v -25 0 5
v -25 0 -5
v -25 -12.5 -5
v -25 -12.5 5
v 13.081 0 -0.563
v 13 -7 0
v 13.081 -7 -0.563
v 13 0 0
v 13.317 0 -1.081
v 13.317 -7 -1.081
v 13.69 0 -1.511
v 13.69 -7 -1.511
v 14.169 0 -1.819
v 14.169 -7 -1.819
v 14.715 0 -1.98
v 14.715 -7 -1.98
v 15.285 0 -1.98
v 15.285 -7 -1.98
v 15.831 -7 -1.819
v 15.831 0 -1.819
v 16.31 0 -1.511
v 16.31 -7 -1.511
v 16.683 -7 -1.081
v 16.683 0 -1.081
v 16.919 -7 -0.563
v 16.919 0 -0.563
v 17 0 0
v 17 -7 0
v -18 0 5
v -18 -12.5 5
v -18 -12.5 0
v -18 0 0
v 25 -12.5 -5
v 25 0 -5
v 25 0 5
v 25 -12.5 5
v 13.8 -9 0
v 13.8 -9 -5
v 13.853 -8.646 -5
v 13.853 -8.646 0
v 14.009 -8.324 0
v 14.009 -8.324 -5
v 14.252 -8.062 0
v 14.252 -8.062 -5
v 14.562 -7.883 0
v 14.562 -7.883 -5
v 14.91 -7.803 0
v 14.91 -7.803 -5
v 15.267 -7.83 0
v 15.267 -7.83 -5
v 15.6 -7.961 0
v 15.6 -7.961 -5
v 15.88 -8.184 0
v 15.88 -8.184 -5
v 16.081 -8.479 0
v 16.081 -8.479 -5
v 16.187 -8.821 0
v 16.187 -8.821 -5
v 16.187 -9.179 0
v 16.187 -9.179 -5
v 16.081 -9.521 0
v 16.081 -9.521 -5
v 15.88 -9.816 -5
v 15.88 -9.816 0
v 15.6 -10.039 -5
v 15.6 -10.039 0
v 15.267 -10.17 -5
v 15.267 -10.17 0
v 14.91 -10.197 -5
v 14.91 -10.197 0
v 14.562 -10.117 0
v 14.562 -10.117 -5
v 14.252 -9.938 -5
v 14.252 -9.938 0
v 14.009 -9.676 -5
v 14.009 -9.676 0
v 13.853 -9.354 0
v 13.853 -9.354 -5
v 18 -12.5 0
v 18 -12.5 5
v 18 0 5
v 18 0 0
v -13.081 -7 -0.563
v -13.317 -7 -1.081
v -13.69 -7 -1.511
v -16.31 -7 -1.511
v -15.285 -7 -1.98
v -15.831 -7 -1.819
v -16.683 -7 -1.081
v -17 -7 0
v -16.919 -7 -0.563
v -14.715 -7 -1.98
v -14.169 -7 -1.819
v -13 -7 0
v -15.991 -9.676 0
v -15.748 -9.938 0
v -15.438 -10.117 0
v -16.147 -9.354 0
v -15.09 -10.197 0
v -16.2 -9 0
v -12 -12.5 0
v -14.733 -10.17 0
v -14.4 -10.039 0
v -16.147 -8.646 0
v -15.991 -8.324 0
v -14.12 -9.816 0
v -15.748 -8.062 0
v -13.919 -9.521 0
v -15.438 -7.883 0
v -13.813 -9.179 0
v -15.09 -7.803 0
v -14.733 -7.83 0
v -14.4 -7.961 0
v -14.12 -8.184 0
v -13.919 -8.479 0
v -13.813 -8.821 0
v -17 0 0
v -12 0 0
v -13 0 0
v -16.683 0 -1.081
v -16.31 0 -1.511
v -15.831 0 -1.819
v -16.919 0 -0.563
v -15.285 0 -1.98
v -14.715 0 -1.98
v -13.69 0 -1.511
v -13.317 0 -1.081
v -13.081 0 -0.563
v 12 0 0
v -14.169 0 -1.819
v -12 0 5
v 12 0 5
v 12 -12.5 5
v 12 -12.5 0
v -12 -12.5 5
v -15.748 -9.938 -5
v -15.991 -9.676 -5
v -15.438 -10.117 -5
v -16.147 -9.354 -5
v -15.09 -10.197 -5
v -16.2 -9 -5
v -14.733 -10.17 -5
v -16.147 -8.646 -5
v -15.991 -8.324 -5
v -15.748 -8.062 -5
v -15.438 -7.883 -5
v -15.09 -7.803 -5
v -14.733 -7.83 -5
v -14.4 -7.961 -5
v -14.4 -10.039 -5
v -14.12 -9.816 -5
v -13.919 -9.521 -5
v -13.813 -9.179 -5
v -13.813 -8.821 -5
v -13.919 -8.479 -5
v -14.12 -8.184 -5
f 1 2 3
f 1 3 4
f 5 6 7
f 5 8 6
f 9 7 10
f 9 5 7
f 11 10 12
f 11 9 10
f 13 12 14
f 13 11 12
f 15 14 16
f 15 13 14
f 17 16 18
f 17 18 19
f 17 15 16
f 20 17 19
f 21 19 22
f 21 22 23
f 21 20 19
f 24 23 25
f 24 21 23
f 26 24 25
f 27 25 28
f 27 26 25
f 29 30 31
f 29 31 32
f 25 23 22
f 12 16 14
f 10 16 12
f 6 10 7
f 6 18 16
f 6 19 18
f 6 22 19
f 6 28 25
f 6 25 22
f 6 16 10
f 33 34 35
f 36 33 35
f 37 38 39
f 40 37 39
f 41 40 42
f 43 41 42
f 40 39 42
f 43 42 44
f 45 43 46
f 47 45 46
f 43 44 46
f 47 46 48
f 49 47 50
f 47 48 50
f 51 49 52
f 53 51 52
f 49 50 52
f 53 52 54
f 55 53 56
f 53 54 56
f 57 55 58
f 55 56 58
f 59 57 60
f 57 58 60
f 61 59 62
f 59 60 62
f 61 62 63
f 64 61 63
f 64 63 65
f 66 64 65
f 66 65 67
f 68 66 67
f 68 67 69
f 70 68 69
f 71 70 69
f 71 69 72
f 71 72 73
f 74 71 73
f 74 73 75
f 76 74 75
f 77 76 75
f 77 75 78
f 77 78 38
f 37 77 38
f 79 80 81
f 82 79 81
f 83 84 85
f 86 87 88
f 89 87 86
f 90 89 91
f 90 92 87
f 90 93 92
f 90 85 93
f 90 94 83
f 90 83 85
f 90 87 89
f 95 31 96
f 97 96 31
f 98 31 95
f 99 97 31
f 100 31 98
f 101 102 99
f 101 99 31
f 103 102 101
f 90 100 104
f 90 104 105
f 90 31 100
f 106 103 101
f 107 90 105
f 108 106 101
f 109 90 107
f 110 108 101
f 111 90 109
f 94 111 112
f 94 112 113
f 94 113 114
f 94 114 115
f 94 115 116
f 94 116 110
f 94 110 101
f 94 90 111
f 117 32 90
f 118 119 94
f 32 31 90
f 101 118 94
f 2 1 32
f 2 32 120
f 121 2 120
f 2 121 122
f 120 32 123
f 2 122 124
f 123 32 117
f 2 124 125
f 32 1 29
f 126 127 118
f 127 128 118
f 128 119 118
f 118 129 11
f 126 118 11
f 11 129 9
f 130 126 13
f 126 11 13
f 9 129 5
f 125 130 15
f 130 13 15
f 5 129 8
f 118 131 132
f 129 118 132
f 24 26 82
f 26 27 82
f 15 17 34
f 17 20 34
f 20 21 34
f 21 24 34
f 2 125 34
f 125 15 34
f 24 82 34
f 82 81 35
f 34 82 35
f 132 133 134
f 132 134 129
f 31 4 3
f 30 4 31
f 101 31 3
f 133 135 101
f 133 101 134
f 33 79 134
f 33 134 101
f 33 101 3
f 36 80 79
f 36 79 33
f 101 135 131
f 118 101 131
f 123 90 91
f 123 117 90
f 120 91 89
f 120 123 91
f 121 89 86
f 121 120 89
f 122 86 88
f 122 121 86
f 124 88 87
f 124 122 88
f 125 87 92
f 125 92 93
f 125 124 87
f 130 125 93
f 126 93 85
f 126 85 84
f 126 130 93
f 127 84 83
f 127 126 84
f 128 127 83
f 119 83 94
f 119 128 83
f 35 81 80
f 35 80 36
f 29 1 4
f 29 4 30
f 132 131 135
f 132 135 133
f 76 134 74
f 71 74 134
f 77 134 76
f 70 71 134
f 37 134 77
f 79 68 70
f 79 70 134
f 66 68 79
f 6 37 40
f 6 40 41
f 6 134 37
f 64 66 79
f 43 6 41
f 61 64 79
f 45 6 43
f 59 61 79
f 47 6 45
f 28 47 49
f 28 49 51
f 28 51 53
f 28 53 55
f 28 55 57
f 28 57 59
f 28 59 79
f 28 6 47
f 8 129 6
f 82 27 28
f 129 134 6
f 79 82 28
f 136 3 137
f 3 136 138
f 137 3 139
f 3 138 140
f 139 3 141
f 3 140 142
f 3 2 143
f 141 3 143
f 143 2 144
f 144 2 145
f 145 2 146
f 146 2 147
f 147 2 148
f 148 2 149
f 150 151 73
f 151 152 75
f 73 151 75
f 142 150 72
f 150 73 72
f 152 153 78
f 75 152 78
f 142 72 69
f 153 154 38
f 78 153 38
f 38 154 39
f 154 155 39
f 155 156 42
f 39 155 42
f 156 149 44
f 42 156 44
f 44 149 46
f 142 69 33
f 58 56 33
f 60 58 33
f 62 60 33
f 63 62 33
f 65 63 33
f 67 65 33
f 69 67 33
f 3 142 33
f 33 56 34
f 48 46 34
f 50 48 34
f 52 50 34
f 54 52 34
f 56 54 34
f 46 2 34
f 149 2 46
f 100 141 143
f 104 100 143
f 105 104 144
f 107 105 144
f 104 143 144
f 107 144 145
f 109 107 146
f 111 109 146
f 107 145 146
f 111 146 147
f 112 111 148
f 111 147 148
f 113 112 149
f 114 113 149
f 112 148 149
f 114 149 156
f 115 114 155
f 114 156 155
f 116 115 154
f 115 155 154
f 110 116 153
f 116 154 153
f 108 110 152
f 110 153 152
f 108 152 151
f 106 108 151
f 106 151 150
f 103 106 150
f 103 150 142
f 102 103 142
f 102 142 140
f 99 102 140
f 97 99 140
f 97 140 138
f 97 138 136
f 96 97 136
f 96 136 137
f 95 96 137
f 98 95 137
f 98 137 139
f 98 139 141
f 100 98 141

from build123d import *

# Parameters (mm, degrees)
F0_W       = 50
F0_H       = 10
F1_DEPTH   = 12.5
F2_W       = 6
F2_H       = 12.5
F3_DEPTH   = 5
F4_W       = 2
F4_H       = 7
F5_W       = 2
F5_H       = 7
F8_D       = 2.4
F8_ON_F5_D = 2.4


with BuildPart() as f1:
    # F0 (on Front) → F1 (new body)
    with BuildSketch(Plane.XZ):
        Rectangle(F0_W, F0_H)
    extrude(amount=F1_DEPTH)

    # F2 (on face) → F3 (cut)
    with BuildSketch(Plane.XY.offset(5)):
        with Locations((-15, -6.25)):
            Rectangle(F2_W, F2_H)
        with Locations((15, -6.25)):
            Rectangle(F2_W, F2_H)
    extrude(amount=-F3_DEPTH, mode=Mode.SUBTRACT)

    # F4 (on face) → F6 (revolve, cut)
    with BuildSketch(Plane.XY):
        with Locations((-14, -3.5)):
            Rectangle(F4_W, F4_H)
    revolve(axis=Axis((-15, -7.6616932638, 0), (0, -1, 0)), mode=Mode.SUBTRACT)

    # F5 (on face) → F7 (revolve, cut)
    with BuildSketch(Plane.XY):
        with Locations((16, -3.5)):
            Rectangle(F5_W, F5_H)
    revolve(axis=Axis((15, -9.4139035791, 0), (0, -1, 0)), mode=Mode.SUBTRACT)

    # F8 (through all)
    with Locations(Plane.XY):
        with Locations((-15, -9)):
            Hole(F8_D / 2)

    # F8 on F5 (through all)
    with Locations(Plane.XY):
        with Locations((15, -9)):
            Hole(F8_ON_F5_D / 2)


solid = f1.part
